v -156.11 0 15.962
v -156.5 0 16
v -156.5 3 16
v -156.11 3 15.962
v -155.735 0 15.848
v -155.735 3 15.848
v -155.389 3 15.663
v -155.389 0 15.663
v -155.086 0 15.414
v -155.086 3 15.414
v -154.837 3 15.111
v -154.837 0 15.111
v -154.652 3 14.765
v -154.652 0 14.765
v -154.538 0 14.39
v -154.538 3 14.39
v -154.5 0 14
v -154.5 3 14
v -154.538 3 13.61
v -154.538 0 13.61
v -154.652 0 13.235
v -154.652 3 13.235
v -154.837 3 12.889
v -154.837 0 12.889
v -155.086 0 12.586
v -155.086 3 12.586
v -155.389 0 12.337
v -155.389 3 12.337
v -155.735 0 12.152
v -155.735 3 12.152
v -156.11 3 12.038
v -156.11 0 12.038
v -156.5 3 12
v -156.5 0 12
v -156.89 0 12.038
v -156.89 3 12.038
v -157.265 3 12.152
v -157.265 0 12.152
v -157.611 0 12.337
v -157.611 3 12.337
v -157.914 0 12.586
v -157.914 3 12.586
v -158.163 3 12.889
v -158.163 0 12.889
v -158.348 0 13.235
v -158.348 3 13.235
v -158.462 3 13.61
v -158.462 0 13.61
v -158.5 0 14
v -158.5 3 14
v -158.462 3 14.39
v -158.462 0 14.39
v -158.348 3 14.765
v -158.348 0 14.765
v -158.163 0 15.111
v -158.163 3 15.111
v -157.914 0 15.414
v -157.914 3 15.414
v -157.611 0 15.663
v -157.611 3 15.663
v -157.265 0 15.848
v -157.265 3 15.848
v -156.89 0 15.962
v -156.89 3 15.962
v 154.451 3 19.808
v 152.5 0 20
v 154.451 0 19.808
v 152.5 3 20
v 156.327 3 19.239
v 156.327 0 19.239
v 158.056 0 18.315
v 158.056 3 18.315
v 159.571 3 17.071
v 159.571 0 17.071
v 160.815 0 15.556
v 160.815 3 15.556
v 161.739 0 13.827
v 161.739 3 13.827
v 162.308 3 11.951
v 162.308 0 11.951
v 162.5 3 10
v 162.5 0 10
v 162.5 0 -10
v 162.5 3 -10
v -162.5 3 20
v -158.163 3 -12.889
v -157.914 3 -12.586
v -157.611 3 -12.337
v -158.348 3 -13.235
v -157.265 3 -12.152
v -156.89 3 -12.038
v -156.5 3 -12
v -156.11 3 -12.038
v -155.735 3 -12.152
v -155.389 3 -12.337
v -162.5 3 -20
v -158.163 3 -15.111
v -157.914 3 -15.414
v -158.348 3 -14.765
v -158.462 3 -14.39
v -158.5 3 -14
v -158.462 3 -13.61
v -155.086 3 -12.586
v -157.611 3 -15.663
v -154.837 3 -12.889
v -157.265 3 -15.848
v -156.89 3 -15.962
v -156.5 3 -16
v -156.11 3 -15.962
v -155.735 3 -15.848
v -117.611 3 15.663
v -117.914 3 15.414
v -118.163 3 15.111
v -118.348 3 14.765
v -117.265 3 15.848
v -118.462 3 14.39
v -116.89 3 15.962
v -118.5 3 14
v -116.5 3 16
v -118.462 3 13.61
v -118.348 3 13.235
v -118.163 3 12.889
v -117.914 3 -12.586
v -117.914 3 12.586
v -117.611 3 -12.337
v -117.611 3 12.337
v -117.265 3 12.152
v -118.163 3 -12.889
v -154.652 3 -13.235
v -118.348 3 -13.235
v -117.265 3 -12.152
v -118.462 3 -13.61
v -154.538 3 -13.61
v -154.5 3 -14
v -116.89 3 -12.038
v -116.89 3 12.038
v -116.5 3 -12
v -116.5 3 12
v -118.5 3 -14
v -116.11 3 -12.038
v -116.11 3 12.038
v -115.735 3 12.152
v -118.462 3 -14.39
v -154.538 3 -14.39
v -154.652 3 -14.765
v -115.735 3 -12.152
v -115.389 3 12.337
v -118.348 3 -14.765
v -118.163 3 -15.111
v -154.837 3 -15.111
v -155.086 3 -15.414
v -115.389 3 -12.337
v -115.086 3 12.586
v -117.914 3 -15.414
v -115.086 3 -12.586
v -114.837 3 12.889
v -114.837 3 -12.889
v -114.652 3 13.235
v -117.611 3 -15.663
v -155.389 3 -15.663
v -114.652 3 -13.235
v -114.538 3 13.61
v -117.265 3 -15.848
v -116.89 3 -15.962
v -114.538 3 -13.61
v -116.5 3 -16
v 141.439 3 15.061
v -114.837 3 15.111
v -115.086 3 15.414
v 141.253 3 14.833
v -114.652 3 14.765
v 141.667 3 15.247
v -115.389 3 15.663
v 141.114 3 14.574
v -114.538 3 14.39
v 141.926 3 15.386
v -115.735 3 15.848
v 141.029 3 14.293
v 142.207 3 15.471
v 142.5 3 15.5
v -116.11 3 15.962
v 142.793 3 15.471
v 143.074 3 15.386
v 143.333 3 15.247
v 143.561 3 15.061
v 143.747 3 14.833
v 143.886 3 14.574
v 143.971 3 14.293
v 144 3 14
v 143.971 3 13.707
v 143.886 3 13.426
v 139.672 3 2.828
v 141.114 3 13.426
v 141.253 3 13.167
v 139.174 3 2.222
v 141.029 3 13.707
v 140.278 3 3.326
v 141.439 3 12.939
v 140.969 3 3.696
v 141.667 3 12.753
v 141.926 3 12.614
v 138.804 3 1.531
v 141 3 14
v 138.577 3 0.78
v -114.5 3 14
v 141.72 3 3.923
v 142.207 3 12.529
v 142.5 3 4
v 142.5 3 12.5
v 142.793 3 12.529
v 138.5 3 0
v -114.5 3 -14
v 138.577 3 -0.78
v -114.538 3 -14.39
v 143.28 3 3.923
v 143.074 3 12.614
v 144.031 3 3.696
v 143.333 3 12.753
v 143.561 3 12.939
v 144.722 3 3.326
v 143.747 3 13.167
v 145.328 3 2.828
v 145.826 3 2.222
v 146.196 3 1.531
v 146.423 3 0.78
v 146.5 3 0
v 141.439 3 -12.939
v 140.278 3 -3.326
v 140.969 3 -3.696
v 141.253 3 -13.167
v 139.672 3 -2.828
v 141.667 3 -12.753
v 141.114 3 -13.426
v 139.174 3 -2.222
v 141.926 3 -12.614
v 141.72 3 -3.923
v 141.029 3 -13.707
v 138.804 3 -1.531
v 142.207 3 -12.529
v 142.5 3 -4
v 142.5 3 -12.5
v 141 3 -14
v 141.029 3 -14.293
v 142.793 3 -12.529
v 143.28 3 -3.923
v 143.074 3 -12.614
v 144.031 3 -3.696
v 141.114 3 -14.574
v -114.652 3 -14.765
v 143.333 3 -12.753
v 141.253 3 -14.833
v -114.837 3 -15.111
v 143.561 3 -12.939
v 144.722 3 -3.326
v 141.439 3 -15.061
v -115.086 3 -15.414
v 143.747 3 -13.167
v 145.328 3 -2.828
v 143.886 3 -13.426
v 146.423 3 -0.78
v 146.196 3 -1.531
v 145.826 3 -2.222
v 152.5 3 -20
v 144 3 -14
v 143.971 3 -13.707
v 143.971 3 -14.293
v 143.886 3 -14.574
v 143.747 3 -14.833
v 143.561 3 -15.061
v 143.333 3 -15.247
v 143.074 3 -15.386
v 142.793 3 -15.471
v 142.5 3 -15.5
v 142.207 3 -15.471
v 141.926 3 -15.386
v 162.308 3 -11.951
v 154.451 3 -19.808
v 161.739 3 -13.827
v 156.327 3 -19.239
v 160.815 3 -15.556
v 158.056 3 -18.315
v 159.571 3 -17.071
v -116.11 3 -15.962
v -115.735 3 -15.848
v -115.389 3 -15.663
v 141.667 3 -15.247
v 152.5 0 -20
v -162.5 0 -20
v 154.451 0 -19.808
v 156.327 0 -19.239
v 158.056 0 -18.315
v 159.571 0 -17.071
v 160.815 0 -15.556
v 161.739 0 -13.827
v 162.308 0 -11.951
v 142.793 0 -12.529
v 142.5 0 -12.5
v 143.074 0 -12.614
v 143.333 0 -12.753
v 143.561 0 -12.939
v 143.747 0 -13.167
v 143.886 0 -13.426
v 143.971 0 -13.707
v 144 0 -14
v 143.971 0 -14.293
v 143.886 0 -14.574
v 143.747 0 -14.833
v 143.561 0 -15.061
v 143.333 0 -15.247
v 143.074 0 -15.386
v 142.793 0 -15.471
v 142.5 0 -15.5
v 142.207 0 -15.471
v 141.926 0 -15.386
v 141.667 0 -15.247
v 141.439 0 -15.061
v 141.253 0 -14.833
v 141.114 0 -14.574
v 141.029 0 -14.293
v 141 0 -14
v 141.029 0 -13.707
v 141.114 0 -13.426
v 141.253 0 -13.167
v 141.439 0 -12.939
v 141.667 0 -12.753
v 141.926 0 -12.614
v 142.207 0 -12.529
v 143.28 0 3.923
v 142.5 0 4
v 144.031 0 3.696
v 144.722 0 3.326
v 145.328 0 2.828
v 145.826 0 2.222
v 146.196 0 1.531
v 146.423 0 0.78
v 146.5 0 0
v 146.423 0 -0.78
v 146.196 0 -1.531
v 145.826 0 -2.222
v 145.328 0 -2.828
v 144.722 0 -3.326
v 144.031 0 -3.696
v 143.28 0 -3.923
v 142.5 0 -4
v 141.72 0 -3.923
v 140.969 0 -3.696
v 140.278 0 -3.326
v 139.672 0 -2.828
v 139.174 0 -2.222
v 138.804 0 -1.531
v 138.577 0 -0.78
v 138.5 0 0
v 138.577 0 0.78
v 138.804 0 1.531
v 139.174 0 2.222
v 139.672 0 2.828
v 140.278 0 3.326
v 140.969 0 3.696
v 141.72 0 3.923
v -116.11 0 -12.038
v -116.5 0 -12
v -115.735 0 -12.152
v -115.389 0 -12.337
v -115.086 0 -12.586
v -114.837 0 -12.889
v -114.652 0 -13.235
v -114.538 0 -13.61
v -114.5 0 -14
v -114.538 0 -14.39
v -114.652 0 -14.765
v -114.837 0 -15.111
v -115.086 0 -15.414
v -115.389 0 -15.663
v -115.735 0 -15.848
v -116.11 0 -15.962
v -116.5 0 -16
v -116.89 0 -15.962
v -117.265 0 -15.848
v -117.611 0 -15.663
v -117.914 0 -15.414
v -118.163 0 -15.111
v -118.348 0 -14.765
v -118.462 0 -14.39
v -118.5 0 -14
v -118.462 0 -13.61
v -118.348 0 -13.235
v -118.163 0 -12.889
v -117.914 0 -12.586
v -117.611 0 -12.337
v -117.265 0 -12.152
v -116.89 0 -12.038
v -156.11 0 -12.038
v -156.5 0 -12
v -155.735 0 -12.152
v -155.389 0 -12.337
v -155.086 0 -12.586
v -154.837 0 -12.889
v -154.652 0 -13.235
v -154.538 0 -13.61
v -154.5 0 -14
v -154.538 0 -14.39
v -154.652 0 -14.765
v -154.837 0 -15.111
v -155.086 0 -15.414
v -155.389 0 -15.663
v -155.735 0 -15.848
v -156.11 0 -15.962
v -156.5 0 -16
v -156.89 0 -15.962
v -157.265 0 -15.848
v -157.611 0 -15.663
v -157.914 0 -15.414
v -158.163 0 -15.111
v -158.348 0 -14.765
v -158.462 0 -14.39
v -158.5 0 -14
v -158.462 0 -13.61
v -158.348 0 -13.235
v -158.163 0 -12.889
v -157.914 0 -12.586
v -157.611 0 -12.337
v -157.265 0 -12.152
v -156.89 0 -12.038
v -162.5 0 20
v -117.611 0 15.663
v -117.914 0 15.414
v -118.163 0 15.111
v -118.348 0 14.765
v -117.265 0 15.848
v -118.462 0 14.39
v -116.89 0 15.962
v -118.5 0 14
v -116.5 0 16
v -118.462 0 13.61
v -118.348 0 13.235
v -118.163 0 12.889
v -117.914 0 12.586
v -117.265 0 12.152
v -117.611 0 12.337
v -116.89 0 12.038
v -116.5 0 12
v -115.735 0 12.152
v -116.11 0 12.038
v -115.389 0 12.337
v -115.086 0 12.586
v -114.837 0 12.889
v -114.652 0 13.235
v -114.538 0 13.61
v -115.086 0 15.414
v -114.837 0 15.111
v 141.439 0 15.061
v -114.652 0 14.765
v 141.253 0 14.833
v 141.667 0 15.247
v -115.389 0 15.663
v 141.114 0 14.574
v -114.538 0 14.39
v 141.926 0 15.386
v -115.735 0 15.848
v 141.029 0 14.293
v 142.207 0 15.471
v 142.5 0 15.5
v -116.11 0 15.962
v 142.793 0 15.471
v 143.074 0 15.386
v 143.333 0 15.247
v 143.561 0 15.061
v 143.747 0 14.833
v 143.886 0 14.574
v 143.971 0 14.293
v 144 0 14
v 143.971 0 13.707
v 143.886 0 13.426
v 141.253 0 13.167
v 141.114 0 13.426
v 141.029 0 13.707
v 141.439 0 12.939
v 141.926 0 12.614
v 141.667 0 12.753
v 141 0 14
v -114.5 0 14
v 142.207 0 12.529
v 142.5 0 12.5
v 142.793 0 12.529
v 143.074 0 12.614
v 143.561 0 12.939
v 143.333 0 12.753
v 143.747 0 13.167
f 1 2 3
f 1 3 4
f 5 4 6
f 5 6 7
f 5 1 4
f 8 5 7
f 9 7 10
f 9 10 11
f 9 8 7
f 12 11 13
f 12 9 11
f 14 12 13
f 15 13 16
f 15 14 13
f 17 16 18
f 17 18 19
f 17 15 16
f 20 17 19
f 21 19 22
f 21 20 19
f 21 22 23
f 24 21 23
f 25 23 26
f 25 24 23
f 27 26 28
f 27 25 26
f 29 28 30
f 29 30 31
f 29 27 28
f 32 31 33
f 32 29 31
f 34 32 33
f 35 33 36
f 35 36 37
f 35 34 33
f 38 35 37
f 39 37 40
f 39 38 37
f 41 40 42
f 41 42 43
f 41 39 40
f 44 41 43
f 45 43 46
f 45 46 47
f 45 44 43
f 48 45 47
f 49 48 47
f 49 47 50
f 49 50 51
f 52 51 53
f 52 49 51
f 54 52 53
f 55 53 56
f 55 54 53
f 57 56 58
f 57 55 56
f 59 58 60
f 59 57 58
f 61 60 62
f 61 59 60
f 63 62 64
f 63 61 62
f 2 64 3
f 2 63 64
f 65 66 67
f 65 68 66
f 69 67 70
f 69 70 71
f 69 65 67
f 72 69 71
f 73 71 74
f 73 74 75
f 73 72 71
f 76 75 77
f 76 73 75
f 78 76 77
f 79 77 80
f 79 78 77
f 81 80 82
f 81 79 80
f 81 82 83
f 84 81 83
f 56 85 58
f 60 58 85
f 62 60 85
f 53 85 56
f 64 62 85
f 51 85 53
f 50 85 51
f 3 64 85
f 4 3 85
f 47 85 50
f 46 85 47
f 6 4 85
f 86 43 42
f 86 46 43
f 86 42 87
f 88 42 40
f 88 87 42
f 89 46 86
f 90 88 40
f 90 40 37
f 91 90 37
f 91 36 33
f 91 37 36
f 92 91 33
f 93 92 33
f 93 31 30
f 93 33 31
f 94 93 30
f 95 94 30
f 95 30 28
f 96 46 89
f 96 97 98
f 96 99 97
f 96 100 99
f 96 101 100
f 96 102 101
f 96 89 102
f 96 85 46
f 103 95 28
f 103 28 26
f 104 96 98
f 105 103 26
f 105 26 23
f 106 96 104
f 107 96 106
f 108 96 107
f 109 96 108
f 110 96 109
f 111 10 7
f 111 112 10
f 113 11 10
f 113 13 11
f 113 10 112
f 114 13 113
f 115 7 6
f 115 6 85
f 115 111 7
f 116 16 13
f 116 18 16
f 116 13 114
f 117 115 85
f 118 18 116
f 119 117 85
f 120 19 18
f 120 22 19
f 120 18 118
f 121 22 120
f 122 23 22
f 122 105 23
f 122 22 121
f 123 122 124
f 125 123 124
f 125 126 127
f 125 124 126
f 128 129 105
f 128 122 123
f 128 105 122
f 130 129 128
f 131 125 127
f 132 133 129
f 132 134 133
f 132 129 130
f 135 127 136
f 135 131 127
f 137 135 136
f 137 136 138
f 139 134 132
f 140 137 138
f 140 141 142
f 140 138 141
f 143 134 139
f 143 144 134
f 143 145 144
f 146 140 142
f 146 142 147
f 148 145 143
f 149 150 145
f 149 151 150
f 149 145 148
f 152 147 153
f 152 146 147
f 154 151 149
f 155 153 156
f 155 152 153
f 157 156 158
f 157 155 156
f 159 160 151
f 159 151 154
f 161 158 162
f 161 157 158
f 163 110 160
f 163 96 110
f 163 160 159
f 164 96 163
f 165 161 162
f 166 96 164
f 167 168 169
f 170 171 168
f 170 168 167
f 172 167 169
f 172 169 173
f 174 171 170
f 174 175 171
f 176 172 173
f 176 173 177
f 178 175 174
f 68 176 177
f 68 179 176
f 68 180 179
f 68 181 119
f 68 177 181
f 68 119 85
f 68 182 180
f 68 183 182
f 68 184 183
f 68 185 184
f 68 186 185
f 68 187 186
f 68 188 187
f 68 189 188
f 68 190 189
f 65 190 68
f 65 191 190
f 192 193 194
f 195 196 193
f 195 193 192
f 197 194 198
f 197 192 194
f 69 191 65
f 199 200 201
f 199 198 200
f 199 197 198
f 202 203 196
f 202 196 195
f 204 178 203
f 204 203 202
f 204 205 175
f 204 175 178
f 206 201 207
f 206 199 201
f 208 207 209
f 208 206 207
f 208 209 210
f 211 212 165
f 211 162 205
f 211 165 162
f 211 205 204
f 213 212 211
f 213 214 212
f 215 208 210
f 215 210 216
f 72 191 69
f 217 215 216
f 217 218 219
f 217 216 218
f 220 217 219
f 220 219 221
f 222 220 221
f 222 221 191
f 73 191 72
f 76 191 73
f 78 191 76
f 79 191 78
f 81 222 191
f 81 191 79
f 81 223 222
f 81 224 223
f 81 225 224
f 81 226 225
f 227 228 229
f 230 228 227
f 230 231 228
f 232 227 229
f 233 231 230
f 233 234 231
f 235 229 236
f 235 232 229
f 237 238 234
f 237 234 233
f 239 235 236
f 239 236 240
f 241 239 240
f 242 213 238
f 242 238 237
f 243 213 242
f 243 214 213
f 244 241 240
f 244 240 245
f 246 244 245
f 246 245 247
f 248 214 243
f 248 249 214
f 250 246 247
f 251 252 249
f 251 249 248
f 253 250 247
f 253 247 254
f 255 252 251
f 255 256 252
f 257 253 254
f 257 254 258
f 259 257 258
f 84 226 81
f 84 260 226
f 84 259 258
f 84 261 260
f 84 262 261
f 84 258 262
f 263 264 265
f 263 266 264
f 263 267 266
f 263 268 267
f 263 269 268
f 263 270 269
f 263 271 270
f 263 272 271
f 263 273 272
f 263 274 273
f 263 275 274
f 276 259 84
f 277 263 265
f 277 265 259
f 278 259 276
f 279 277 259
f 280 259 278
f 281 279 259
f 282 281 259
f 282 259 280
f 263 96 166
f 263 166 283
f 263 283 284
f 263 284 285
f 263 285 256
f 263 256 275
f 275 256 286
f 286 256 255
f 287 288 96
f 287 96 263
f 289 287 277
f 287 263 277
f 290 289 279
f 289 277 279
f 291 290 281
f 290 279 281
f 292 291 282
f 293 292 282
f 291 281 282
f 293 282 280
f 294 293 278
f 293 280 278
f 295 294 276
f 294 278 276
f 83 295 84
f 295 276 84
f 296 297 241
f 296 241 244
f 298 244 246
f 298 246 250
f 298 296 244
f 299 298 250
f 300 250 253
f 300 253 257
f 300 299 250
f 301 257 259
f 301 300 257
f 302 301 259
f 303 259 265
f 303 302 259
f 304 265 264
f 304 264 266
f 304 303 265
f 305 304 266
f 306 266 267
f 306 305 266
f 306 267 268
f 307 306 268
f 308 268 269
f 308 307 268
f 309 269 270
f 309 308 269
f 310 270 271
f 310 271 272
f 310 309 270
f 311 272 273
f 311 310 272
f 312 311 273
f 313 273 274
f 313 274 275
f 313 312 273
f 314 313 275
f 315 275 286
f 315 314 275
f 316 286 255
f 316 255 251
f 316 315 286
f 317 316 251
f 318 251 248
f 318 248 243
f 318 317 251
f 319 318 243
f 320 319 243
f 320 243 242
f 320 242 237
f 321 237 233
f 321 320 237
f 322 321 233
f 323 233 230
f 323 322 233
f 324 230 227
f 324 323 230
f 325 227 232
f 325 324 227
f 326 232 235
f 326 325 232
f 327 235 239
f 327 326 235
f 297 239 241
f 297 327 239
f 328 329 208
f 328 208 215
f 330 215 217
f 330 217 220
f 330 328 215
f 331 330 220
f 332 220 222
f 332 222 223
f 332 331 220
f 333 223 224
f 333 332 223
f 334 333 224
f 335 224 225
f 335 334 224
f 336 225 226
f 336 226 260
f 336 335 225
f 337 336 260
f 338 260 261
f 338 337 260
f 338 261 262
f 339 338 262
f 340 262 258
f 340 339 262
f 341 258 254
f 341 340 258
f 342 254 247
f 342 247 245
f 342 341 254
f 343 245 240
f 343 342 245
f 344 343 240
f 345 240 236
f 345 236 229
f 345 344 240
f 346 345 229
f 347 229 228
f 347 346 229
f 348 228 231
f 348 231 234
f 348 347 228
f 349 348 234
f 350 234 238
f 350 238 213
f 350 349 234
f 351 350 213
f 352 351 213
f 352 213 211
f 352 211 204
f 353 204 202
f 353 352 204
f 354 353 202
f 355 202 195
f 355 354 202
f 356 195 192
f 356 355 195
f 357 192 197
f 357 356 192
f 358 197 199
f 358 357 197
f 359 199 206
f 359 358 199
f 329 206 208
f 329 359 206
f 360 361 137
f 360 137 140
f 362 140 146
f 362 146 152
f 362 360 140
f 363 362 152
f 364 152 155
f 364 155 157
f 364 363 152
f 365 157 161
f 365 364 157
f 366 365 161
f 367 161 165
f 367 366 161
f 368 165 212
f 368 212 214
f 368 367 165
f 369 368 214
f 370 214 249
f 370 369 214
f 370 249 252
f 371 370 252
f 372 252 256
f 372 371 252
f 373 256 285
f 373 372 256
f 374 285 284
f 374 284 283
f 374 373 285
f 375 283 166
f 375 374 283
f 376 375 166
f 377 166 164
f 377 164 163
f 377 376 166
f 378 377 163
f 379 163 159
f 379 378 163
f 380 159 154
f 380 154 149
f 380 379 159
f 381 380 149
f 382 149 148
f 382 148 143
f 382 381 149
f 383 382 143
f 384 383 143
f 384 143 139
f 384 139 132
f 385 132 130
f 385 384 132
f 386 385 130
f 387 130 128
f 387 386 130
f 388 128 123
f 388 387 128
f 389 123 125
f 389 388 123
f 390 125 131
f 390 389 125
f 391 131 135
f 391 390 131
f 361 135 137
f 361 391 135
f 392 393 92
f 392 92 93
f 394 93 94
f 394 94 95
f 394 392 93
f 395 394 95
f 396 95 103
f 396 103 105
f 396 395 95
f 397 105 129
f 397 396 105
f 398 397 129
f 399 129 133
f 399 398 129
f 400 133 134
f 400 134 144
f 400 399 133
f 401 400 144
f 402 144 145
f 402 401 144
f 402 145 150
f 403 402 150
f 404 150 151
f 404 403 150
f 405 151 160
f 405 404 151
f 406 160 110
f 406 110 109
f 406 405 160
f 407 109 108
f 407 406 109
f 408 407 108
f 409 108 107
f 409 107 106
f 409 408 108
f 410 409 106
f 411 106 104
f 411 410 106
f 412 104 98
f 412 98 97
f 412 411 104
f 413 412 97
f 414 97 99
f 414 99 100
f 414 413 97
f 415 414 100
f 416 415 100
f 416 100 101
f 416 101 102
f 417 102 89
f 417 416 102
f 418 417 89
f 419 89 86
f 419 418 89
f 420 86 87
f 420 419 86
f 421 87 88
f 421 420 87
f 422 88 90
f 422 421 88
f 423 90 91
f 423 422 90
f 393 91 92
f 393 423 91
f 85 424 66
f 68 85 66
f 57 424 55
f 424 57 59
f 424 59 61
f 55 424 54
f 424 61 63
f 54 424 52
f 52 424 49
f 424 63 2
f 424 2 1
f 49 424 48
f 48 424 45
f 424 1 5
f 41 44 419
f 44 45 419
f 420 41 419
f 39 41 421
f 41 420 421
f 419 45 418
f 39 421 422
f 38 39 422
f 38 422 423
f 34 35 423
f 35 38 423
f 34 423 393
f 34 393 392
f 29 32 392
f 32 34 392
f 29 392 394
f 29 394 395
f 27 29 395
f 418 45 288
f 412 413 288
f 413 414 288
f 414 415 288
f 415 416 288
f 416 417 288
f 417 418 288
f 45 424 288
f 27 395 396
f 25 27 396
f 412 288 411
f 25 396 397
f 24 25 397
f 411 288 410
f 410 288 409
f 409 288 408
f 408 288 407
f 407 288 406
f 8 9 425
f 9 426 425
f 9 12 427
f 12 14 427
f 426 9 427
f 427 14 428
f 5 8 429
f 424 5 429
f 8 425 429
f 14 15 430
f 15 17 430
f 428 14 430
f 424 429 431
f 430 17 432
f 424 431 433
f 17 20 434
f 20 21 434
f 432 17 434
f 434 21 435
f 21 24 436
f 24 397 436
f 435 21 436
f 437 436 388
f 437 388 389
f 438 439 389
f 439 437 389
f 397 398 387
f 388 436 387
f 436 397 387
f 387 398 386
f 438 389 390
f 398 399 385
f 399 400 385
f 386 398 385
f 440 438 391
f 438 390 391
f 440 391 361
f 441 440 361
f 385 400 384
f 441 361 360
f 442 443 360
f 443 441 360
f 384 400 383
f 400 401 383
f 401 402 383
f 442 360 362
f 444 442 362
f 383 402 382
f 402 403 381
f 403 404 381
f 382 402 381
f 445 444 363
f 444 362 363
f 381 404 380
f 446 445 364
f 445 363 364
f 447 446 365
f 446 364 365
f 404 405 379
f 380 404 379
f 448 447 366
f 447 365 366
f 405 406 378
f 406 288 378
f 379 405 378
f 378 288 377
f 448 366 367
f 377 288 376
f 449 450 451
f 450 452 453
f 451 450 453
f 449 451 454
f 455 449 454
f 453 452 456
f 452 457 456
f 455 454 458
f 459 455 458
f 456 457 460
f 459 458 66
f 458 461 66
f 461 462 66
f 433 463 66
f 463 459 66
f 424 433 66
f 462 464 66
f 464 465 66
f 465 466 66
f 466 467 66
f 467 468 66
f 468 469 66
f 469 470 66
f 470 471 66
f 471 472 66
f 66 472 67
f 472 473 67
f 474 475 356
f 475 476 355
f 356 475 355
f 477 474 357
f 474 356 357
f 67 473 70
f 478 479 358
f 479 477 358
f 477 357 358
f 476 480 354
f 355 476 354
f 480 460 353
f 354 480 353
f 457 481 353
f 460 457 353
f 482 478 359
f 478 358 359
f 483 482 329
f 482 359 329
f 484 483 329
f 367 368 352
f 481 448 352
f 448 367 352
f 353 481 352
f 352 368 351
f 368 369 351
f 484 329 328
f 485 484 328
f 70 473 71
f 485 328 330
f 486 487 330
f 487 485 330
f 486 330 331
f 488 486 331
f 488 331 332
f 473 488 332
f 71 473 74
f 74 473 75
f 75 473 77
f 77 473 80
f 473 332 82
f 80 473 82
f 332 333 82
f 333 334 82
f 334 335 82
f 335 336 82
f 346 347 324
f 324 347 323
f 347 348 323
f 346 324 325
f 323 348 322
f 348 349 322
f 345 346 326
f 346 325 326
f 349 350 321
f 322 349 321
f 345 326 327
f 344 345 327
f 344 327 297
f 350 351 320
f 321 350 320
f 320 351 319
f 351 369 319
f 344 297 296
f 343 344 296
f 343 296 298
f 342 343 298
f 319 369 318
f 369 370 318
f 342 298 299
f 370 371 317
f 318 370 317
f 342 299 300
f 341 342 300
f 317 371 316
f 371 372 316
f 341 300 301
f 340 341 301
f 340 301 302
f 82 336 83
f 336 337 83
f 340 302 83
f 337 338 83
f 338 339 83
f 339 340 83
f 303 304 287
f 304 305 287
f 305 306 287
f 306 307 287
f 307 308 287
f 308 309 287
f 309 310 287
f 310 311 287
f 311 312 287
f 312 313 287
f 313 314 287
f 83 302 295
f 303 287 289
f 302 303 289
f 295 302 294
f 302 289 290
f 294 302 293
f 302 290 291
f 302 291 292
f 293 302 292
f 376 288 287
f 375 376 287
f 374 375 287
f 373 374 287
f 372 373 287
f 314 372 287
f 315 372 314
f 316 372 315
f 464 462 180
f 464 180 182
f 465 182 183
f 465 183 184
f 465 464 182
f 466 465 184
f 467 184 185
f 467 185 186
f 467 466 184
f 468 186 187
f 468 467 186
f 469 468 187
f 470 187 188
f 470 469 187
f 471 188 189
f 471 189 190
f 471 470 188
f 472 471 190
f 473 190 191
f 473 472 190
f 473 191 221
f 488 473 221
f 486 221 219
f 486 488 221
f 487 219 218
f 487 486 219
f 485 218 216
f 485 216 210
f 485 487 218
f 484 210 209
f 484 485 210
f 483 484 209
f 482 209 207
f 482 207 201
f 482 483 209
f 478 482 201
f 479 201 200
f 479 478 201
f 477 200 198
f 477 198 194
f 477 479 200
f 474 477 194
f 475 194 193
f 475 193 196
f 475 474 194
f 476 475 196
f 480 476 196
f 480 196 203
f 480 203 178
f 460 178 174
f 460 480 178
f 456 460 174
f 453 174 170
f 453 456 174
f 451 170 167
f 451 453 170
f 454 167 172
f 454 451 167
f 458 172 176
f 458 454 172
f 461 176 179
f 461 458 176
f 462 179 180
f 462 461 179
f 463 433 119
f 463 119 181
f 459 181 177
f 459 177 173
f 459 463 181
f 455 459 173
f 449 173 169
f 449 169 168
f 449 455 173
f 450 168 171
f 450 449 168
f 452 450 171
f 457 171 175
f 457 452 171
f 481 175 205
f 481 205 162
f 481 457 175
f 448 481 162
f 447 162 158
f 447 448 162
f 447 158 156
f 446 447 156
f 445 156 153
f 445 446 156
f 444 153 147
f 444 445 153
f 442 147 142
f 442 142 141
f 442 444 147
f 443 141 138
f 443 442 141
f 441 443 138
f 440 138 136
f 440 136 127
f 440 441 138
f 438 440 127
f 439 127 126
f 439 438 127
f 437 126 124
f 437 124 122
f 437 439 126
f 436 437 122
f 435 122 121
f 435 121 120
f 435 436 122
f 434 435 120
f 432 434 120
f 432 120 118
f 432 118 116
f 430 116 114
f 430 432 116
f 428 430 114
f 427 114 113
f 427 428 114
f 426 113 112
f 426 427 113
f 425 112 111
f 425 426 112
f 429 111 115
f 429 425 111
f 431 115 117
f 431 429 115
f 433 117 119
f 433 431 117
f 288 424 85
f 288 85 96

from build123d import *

# Parameters (mm, degrees)
SKETCH1_W           = 325
SKETCH1_H           = 40
SKETCH1_R           = 2
SKETCH1_R_2         = 4
SKETCH1_R_3         = 1.5
BOSS_EXTRUDE1_DEPTH = 3
FILLET1_R           = 10


with BuildPart() as part:
    # Sketch1 → Boss-Extrude1 (new body)
    with BuildSketch(Plane(origin=(0, 0, 0), x_dir=(1, 0, 0), z_dir=(0, 1, 0))):
        Rectangle(SKETCH1_W, SKETCH1_H)
        with Locations(Location((-156.5, 14, 0), (0, 0, 270))):
            Circle(SKETCH1_R, mode=Mode.SUBTRACT)
        with Locations(Location((-116.5, 14, 0), (0, 0, 270))):
            Circle(SKETCH1_R, mode=Mode.SUBTRACT)
        with Locations(Location((-116.5, -14, 0), (0, 0, 270))):
            Circle(SKETCH1_R, mode=Mode.SUBTRACT)
        with Locations(Location((-156.5, -14, 0), (0, 0, 270))):
            Circle(SKETCH1_R, mode=Mode.SUBTRACT)
        with Locations(Location((142.5, 0, 0), (0, 0, 270))):
            Circle(SKETCH1_R_2, mode=Mode.SUBTRACT)
        with Locations(Location((142.5, 14, 0), (0, 0, 270))):
            Circle(SKETCH1_R_3, mode=Mode.SUBTRACT)
        with Locations(Location((142.5, -14, 0), (0, 0, 270))):
            Circle(SKETCH1_R_3, mode=Mode.SUBTRACT)
    extrude(amount=BOSS_EXTRUDE1_DEPTH)

    # Fillet1
    fillet1_edges = [part.edges().sort_by_distance(p)[0] for p in [
        (162.5, 1.5, 20),
        (162.5, 1.5, -20),
    ]]
    fillet(fillet1_edges, radius=FILLET1_R)


solid = part.part
